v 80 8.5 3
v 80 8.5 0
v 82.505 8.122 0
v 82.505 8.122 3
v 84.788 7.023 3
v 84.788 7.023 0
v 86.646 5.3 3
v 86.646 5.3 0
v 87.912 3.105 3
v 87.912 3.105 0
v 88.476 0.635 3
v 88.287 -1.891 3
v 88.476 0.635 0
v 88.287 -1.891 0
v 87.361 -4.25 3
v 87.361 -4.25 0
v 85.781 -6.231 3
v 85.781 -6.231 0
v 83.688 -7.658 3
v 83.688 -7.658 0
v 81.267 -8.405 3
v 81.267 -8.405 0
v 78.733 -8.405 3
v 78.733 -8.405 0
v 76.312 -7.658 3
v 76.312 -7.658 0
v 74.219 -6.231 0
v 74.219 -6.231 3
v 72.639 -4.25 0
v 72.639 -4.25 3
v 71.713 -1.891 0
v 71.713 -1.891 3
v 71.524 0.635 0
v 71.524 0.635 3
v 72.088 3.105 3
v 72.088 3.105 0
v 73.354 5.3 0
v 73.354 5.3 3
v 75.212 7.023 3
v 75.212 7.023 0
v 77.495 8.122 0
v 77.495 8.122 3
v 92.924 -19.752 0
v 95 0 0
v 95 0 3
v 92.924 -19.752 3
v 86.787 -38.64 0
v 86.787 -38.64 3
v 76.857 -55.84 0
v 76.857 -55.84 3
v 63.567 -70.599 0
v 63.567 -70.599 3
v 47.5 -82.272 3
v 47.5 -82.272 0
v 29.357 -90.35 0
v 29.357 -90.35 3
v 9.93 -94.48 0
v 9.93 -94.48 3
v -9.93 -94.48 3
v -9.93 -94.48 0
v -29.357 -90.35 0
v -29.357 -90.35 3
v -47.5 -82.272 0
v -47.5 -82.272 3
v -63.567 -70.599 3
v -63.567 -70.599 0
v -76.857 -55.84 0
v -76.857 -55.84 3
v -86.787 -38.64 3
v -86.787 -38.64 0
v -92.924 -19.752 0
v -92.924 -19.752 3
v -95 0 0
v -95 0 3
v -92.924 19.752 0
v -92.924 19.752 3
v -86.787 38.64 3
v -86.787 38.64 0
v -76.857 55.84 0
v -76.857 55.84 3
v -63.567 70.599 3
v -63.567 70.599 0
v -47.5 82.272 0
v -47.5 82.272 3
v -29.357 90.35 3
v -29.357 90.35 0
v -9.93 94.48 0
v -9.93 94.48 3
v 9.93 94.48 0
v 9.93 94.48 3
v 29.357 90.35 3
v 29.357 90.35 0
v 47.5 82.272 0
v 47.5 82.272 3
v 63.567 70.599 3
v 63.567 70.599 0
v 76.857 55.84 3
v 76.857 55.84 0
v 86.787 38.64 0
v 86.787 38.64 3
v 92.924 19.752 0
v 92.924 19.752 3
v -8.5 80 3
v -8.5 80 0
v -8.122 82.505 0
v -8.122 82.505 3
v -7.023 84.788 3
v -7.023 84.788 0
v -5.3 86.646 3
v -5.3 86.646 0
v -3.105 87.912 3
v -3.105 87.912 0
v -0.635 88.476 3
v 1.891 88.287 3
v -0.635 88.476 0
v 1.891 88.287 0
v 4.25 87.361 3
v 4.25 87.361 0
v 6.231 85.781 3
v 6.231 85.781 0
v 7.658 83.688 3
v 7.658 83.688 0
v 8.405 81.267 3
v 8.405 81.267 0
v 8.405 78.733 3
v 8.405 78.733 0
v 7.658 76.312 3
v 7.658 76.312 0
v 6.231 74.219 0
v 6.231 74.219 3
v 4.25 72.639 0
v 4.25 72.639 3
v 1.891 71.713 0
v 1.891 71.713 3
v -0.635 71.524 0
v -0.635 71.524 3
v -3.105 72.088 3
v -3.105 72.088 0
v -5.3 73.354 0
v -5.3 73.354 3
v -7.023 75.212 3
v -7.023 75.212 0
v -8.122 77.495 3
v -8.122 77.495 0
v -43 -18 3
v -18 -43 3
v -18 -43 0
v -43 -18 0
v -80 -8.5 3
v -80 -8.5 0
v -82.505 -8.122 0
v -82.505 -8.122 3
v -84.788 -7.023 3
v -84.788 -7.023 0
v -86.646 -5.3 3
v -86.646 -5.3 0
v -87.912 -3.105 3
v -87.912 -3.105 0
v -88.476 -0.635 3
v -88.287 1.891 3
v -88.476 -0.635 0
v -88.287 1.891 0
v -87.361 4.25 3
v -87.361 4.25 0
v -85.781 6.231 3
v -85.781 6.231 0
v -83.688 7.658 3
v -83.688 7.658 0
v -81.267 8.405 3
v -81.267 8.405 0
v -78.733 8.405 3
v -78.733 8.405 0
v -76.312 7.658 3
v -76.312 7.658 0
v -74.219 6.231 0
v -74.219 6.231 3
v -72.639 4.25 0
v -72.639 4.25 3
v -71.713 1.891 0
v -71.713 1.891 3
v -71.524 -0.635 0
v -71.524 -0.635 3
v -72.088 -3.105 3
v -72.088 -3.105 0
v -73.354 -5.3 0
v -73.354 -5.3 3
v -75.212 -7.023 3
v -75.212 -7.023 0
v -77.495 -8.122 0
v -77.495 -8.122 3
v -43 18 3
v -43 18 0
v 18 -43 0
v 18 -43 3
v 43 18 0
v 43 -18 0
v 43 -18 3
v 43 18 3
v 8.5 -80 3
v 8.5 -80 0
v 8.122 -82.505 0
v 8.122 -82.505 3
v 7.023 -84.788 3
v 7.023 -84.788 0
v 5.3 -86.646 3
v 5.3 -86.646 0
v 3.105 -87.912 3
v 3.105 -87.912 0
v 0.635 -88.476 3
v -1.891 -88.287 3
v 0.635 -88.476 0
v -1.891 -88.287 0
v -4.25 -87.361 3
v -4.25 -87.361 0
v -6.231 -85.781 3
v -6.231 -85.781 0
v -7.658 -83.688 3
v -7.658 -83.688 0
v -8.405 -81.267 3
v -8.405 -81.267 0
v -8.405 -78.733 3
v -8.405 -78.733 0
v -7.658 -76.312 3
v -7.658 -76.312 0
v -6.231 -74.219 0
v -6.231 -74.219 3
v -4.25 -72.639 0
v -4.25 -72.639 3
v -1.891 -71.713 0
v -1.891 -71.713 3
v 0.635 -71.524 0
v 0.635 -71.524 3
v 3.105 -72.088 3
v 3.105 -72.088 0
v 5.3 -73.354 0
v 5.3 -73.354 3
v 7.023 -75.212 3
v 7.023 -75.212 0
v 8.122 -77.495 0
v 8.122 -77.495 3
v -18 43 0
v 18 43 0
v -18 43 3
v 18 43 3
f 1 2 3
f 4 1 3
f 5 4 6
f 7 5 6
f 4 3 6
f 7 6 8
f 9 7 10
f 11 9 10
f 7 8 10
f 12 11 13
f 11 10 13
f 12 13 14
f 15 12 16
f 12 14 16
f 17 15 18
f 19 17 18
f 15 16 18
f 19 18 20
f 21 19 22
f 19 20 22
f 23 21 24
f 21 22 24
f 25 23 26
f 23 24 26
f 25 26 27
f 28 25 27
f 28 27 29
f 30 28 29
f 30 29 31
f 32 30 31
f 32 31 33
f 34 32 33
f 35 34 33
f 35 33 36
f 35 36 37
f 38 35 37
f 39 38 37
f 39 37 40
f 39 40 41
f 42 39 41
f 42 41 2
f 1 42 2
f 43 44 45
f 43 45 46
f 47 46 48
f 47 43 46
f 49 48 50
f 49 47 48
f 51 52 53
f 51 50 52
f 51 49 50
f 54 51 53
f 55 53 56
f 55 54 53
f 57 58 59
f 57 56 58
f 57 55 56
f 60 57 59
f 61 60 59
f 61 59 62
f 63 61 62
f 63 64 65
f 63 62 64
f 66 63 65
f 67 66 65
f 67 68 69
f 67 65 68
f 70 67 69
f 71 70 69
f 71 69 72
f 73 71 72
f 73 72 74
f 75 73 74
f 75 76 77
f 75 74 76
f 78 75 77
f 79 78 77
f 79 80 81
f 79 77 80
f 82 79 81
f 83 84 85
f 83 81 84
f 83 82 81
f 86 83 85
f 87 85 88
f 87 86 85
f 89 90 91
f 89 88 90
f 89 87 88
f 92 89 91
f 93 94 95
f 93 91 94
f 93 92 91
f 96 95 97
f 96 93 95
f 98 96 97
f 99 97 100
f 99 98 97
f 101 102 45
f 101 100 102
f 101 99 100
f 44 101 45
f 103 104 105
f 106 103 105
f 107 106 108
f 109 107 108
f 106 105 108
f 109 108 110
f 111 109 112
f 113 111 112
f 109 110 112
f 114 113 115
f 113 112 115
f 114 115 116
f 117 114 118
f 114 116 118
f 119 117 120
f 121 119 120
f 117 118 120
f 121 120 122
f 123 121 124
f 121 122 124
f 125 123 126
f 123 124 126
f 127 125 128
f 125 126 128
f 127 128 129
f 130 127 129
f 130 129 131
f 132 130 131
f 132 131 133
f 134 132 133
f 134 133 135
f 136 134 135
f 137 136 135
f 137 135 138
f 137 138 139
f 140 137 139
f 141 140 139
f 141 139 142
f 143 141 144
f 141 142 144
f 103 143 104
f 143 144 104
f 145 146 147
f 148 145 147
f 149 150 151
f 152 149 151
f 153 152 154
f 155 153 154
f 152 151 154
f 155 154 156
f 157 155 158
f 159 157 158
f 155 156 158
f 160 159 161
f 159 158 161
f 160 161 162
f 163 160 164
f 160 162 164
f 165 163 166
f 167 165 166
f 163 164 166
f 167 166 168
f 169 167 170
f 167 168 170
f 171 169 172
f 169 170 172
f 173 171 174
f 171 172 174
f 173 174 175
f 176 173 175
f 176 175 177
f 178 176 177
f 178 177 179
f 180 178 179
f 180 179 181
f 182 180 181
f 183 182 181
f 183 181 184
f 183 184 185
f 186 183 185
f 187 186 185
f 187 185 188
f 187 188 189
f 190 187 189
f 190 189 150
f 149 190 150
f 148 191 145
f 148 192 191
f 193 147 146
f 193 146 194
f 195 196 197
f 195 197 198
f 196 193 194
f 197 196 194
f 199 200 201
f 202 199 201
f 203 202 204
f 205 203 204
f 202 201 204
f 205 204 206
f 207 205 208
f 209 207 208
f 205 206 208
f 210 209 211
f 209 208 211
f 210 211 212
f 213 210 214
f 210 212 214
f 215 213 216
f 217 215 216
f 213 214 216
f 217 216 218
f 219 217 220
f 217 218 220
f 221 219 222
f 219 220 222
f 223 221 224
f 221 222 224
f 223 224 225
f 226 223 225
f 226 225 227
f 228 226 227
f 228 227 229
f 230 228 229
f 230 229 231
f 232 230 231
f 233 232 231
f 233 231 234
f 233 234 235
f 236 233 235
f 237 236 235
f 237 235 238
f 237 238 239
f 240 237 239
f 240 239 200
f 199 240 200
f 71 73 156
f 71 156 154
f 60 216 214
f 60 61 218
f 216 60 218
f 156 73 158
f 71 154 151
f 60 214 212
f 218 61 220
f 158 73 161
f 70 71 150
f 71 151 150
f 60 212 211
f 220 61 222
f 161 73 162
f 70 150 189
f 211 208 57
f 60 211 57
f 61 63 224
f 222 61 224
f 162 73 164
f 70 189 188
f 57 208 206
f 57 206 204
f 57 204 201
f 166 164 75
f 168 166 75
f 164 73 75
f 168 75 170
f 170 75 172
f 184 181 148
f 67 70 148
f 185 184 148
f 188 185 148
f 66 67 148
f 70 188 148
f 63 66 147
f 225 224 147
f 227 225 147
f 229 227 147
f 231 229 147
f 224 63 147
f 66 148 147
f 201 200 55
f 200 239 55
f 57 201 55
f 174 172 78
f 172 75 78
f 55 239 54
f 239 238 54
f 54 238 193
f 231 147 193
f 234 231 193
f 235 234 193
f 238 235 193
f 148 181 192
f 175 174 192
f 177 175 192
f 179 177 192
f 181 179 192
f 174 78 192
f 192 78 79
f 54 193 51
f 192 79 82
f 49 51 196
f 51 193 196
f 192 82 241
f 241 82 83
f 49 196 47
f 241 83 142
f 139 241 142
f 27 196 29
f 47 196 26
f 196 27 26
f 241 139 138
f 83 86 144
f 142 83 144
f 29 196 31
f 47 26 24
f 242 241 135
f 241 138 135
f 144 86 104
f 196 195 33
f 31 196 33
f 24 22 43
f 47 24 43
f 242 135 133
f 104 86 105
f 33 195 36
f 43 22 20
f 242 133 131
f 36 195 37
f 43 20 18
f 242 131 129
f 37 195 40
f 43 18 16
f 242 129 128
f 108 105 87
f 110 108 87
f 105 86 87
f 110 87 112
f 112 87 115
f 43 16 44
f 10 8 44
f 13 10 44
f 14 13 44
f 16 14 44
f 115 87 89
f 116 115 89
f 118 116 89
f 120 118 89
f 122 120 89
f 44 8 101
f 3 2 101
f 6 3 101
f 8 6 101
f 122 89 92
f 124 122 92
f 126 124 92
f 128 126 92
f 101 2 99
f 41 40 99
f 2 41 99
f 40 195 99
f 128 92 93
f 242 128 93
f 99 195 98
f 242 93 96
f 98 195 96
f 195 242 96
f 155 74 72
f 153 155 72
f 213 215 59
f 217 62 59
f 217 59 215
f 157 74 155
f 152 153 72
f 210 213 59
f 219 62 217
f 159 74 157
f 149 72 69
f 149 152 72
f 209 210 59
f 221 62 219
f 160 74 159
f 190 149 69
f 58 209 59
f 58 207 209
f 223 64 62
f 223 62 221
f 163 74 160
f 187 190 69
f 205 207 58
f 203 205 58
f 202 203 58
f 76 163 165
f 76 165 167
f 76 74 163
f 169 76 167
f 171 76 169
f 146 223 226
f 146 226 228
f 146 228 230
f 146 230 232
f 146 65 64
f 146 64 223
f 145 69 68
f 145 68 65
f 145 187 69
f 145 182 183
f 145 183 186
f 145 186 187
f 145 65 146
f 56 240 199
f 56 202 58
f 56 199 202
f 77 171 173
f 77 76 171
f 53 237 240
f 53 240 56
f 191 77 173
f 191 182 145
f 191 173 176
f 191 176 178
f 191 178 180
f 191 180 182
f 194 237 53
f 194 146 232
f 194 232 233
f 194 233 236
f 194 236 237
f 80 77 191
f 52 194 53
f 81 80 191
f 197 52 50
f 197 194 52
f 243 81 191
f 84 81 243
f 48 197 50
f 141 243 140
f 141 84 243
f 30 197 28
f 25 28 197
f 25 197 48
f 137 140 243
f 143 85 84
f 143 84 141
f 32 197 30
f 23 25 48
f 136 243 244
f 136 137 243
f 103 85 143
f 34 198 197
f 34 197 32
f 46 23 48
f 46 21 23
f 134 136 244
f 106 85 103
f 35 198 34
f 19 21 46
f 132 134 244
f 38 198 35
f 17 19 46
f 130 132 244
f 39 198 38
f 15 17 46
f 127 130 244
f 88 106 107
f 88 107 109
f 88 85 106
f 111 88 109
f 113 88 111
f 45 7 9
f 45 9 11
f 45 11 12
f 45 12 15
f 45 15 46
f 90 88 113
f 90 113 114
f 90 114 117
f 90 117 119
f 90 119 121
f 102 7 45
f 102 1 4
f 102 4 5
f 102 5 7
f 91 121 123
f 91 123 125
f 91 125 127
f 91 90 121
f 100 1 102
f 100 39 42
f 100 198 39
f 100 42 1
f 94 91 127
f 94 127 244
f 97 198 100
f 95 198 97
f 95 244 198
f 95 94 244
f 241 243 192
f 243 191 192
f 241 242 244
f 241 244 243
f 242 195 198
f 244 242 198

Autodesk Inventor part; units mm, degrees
ref_plane "YZ Plane" through (0, 0, 0) normal (1, 0, 0) x (0, 1, 0)
ref_plane "XZ Plane" through (0, 0, 0) normal (0, 1, 0) x (-1, 0, 0)
ref_plane "XY Plane" through (0, 0, 0) normal (0, 0, 1) x (1, 0, 0)
sketch "Sketch1" plane through (0, 0, 0) normal (0, 0, 1) x (1, 0, 0)
  circle A0 centre (0, 0) radius 95
  line L0 (43, 43) -> (-43, 43)
  line L1 (-43, 43) -> (-43, -43)
  line L2 (-43, -43) -> (43, -43)
  line L3 (43, -43) -> (43, 43)
  line L4 (43, 43) -> (-43, -43) construction
  line L5 (-43, 43) -> (43, -43) construction
  dimension "d157" = 190
  dimension "d158" = 86
  dimension "d159" = 86
extrude "Plate5" add sketch "Sketch1" along normal blind 3
sketch "Sketch7" plane through (0, 0, 0) normal (0, 0, -1) x (-1, 0, 0)
  circle A0 centre (0, 80) radius 8.5
  point P0 (0, 0)
  dimension "d160" = 17
  dimension "d161" = 80
extrude "Cut1" cut sketch "Sketch7" against normal blind 3
pattern_circular "Circular Pattern1" count 4 over 360 about axis through (0, 0, -10) along (0, 0, 1) of "Cut1"
chamfer "Corner Chamfer2" distance 25 angle 45 4 edges at (-43, -43, 1.5) (43, -43, 1.5) (-43, 43, 1.5) (43, 43, 1.5)
properties part number "TZS 0972 funnel FLANGE 50-90" material "Stainless Steel"
